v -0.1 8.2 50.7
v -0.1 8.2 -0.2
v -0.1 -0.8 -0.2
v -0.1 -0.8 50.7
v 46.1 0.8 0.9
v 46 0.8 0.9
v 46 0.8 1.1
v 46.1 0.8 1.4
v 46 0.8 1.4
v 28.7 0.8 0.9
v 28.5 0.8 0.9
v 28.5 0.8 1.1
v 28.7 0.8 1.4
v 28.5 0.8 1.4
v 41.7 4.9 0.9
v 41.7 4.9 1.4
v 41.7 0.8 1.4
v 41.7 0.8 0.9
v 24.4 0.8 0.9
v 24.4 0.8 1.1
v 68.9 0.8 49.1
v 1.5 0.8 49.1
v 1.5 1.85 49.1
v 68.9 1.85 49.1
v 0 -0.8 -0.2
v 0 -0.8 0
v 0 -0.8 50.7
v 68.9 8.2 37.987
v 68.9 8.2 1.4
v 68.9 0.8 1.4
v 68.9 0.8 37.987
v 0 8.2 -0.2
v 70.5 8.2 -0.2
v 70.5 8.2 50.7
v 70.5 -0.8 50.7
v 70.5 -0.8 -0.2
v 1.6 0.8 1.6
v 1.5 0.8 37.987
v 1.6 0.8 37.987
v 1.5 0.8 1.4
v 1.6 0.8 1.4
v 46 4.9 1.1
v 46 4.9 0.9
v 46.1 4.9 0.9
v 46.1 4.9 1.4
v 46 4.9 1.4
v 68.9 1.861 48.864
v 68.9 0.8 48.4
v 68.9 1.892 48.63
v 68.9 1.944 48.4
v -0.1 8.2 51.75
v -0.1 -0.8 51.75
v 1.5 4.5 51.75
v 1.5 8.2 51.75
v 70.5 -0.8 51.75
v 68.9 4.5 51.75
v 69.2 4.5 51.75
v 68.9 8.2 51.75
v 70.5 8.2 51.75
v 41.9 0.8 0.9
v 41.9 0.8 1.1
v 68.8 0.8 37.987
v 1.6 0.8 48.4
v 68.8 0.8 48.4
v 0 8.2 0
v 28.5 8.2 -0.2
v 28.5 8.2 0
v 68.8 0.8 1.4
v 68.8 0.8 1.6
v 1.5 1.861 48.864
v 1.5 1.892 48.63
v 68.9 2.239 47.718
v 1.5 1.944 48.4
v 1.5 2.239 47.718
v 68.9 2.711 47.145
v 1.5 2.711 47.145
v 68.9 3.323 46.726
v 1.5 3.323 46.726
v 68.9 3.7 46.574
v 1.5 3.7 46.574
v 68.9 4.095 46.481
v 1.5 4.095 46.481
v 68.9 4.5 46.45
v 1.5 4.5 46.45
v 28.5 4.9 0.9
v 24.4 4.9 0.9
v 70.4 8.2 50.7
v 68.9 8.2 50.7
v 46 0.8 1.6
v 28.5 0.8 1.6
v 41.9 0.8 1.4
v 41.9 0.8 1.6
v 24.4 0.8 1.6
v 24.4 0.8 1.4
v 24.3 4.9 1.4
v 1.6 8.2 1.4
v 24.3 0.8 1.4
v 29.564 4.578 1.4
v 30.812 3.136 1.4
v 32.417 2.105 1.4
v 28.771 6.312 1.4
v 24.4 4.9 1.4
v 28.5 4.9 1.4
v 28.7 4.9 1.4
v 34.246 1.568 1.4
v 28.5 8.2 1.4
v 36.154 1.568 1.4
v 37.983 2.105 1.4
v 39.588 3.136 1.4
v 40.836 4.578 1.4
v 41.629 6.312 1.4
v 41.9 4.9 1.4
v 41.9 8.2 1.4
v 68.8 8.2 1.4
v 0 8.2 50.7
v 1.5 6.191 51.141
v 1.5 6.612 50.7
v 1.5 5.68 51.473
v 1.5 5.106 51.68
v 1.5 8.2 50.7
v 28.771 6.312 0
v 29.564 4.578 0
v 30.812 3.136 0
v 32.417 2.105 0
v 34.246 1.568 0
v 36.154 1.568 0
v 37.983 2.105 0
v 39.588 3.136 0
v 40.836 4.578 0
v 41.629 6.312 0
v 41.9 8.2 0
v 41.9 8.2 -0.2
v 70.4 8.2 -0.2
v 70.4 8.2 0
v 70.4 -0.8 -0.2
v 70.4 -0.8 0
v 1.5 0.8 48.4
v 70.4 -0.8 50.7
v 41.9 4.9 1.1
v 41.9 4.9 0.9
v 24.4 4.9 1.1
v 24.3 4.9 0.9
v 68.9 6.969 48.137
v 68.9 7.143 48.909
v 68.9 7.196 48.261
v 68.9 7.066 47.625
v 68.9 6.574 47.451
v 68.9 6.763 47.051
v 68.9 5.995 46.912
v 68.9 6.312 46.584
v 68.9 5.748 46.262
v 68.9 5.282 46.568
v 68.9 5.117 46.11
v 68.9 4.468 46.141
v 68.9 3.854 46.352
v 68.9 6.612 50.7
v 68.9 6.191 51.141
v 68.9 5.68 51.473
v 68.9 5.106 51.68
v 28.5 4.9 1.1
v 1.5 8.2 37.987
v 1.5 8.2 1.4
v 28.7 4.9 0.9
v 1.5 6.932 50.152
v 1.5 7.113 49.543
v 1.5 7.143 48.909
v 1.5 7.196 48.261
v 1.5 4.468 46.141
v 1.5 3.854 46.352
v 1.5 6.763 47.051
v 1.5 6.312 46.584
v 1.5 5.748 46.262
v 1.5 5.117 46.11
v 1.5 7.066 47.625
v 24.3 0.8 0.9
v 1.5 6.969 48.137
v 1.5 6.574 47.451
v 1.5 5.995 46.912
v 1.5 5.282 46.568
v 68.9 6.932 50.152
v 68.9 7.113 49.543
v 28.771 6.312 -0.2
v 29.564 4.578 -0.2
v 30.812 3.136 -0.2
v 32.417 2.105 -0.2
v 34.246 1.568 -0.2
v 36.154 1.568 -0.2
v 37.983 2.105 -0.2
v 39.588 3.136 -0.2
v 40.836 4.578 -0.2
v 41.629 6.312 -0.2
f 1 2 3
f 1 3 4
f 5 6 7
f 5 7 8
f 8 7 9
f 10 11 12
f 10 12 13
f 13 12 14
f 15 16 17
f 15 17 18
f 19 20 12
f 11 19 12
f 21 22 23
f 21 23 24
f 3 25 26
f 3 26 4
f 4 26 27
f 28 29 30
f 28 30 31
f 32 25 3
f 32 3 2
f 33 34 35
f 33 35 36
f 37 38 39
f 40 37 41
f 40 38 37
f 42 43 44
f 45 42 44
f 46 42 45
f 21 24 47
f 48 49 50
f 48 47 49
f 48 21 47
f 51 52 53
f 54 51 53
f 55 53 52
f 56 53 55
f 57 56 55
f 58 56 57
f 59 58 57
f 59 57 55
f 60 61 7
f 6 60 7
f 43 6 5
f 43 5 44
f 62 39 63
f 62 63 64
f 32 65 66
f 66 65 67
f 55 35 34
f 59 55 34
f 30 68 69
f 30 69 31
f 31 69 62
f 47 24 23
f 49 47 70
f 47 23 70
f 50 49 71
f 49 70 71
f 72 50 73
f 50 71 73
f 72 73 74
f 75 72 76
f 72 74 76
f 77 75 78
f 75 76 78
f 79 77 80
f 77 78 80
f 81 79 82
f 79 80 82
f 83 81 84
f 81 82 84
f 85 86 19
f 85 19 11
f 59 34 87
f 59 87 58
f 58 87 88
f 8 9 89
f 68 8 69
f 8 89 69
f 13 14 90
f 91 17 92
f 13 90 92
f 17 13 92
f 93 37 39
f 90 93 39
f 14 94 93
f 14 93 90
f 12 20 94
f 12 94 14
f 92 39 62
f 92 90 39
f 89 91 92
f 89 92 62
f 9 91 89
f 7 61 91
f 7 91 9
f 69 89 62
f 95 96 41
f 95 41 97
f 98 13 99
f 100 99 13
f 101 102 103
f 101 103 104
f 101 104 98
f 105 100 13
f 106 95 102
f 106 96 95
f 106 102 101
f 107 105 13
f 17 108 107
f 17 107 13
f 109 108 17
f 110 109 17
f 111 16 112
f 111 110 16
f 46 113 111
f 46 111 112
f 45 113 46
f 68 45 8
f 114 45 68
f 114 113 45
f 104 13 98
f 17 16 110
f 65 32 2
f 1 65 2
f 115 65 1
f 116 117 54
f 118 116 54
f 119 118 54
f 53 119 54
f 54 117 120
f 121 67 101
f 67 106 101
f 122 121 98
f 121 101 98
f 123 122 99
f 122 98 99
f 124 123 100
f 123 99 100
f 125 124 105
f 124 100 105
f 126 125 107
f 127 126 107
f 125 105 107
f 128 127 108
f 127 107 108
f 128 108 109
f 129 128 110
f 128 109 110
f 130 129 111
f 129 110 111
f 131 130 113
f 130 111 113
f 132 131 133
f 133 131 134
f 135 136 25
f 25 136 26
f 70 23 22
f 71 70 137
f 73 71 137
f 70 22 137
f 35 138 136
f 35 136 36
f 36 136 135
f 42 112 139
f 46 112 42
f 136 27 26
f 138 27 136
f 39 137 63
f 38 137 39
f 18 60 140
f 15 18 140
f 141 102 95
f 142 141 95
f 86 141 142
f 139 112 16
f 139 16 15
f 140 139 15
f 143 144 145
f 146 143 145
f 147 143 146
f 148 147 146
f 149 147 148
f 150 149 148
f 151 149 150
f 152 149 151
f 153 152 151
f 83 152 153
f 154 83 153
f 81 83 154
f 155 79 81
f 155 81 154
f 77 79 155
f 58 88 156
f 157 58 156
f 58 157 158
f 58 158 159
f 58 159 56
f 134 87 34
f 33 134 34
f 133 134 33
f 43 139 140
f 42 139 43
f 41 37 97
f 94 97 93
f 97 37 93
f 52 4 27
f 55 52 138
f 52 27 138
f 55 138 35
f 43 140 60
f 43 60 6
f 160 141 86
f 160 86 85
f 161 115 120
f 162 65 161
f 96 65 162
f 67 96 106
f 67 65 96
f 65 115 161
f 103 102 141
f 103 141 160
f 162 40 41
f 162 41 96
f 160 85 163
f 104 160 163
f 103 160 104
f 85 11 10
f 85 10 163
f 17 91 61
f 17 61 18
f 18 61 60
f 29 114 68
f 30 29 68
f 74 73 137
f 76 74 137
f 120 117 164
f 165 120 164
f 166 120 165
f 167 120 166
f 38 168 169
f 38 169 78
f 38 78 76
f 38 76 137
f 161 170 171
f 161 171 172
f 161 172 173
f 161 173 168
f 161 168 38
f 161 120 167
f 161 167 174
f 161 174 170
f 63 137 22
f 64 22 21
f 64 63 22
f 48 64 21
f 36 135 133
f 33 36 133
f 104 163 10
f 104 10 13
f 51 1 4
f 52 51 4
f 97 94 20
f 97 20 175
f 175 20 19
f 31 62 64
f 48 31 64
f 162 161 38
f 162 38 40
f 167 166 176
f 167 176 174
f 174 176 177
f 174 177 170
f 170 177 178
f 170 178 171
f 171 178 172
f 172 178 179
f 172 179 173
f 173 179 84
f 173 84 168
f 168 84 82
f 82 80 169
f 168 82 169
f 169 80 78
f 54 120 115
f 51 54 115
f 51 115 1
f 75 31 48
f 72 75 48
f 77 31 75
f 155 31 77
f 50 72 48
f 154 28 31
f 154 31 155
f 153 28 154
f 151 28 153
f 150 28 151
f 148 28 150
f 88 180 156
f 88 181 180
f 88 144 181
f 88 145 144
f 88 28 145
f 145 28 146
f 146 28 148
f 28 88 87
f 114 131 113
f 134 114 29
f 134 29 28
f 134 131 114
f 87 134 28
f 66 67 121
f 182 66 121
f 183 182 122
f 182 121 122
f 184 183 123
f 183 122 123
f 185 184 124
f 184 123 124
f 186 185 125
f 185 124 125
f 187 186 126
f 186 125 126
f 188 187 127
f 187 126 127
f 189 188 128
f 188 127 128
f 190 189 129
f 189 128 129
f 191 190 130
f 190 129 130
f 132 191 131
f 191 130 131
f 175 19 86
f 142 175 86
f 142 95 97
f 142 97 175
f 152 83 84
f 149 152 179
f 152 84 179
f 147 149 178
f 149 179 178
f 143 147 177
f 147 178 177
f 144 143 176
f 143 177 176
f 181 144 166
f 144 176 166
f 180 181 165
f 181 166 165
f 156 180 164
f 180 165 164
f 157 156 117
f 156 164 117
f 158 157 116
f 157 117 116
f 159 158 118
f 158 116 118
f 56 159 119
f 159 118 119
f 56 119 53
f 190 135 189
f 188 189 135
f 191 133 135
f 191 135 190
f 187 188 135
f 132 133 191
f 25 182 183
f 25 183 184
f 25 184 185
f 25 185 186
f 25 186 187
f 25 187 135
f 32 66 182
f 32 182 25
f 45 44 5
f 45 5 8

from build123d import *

# Parameters (mm, degrees)
SKETCH1_W            = 70.4
SKETCH1_H            = 50.7
BOSS_EXTRUDE1_DEPTH  = 1.6
SKETCH2_W            = 70.4
SKETCH2_H            = 2.3
BOSS_EXTRUDE2_DEPTH  = 3.3
SKETCH4_R            = 2.3
BOSS_EXTRUDE3_DEPTH  = 70.4
BOSS_EXTRUDE4_DEPTH  = 6.6
SKETCH6_R            = 6.7
CUT_EXTRUDE1_DEPTH   = 6.6
SKETCH7_W            = 4.1
SKETCH7_H            = 3.3
CUT_EXTRUDE2_DEPTH   = 0.5
SKETCH9_W            = 70.4
SKETCH9_H            = 50.7
BOSS_EXTRUDE5_DEPTH  = 0.8
CUT_EXTRUDE3_DEPTH   = 0.8
BOSS_EXTRUDE6_DEPTH  = 0.2
CUT_EXTRUDE4_DEPTH   = 0.2
SKETCH13_W           = 4.1
SKETCH13_H           = 4.1
CUT_EXTRUDE5_DEPTH   = 0.2
SKETCH14_W           = 50.9
SKETCH14_H           = 9
BOSS_EXTRUDE7_DEPTH  = 0.1
CUT_EXTRUDE6_START   = -0.1
CUT_EXTRUDE6_DEPTH   = 0.1
CUT_EXTRUDE7_DEPTH   = 0.1
SKETCH17_W           = 50.9
SKETCH17_H           = 9
BOSS_EXTRUDE8_DEPTH  = 0.1
SKETCH18_W           = 0.5
SKETCH18_H           = 4.1
CUT_EXTRUDE8_DEPTH   = 0.2
SKETCH19_W           = 0.5
SKETCH19_H           = 4.1
CUT_EXTRUDE9_DEPTH   = 0.2
SKETCH21_W           = 0.5
SKETCH21_H           = 4.1
CUT_EXTRUDE10_DEPTH  = 0.1
SKETCH22_W           = 0.5
SKETCH22_H           = 4.1
CUT_EXTRUDE11_DEPTH  = 0.1
SKETCH24_W           = 67.4
SKETCH24_H           = 15.486571252
CUT_EXTRUDE12_DEPTH  = 23.1
SKETCH25_W           = 67.4
SKETCH25_H           = 1.6
BOSS_EXTRUDE9_DEPTH  = 3.7
SKETCH26_R           = 2.65
BOSS_EXTRUDE10_DEPTH = 67.7
BOSS_EXTRUDE13_DEPTH = 1.05


with BuildPart() as part:
    # Sketch1 → Boss-Extrude1 (new body)
    with BuildSketch(Plane(origin=(0, 0, 0), x_dir=(1, 0, 0), z_dir=(0, 1, 0))):
        with Locations((35.2, -25.35)):
            Rectangle(SKETCH1_W, SKETCH1_H)
    extrude(amount=BOSS_EXTRUDE1_DEPTH)

    # Sketch2 → Boss-Extrude2 (add)
    with BuildSketch(Plane(origin=(0, 1.6, 0), x_dir=(1, 0, 0), z_dir=(0, 1, 0))):
        with Locations((35.2, -49.55)):
            Rectangle(SKETCH2_W, SKETCH2_H)
    extrude(amount=BOSS_EXTRUDE2_DEPTH)

    # Sketch4 → Boss-Extrude3 (add)
    with BuildSketch(Plane.ZY):
        with Locations((48.4, 4.9)):
            Circle(SKETCH4_R)
    extrude(amount=-BOSS_EXTRUDE3_DEPTH)

    # Sketch5 → Boss-Extrude4 (add)
    with BuildSketch(Plane(origin=(0, 1.6, 0), x_dir=(1, 0, 0), z_dir=(0, 1, 0))):
        Polygon((1.6, -1.6), (68.8, -1.6), (68.8, -50.7), (70.4, -50.7), (70.4, 0), (0, 0), (0, -50.7), (1.6, -50.7), align=None)
    extrude(amount=BOSS_EXTRUDE4_DEPTH)

    # Sketch6 → Cut-Extrude1 (cut)
    with BuildSketch(Plane.XY.offset(1.6)):
        with Locations((35.2, 8.2)):
            Circle(SKETCH6_R)
    extrude(amount=-CUT_EXTRUDE1_DEPTH, mode=Mode.SUBTRACT)

    # Sketch7 → Cut-Extrude2 (cut)
    with BuildSketch(Plane.XY.offset(1.6)):
        with Locations((43.95, 3.25)):
            Rectangle(SKETCH7_W, SKETCH7_H)
        with Locations((26.45, 3.25)):
            Rectangle(SKETCH7_W, SKETCH7_H)
    extrude(amount=-CUT_EXTRUDE2_DEPTH, mode=Mode.SUBTRACT)

    # Sketch9 → Boss-Extrude5 (add)
    with BuildSketch(Plane.XZ):
        with Locations((35.2, 25.35)):
            Rectangle(SKETCH9_W, SKETCH9_H)
    extrude(amount=BOSS_EXTRUDE5_DEPTH)

    # Sketch10 → Cut-Extrude3 (cut)
    with BuildSketch(Plane(origin=(0, 1.6, 0), x_dir=(1, 0, 0), z_dir=(0, 1, 0))):
        Polygon((24.4, -1.6), (1.6, -1.6), (1.6, -48.4), (68.8, -48.4), (68.8, -1.6), (46, -1.6), (46, -1.1), (41.9, -1.1), (41.9, -1.6), (36.353256259, -1.6), (34.046743741, -1.6), (28.5, -1.6), (28.5, -1.1), (24.4, -1.1), align=None)
    extrude(amount=-CUT_EXTRUDE3_DEPTH, mode=Mode.SUBTRACT)

    # Sketch11 → Boss-Extrude6 (add)
    with BuildSketch(Plane(origin=(0, 0, 0), x_dir=(-1, 0, 0), z_dir=(0, 0, -1))):
        with BuildLine():
            Line((0, 8.2), (-28.5, 8.2))
            ThreePointArc((-28.5, 8.2), (-35.2, 1.5), (-41.9, 8.2))
            Line((-41.9, 8.2), (-70.4, 8.2))
            Line((-70.4, 8.2), (-70.4, -0.8))
            Line((-70.4, -0.8), (0, -0.8))
            Line((0, -0.8), (0, 8.2))
        make_face()
    extrude(amount=BOSS_EXTRUDE6_DEPTH)

    # Sketch12 → Cut-Extrude4 (cut)
    with BuildSketch(Plane.XY.offset(1.6)):
        with BuildLine():
            Line((28.5, 4.9), (28.5, 0.8))
            Line((28.5, 0.8), (41.9, 0.8))
            Line((41.9, 0.8), (41.9, 4.9))
            Line((41.9, 4.9), (46, 4.9))
            Line((46, 4.9), (46, 0.8))
            Line((46, 0.8), (68.8, 0.8))
            Line((68.8, 0.8), (68.8, 8.2))
            Line((68.8, 8.2), (41.9, 8.2))
            ThreePointArc((41.9, 8.2), (35.2, 1.5), (28.5, 8.2))
            Line((28.5, 8.2), (1.6, 8.2))
            Line((1.6, 8.2), (1.6, 0.8))
            Line((1.6, 0.8), (24.4, 0.8))
            Line((24.4, 0.8), (24.4, 4.9))
            Line((24.4, 4.9), (28.5, 4.9))
        make_face()
    extrude(amount=-CUT_EXTRUDE4_DEPTH, mode=Mode.SUBTRACT)

    # Sketch13 → Cut-Extrude5 (cut)
    with BuildSketch(Plane.XY.offset(1.1)):
        with Locations((43.95, 2.85)):
            Rectangle(SKETCH13_W, SKETCH13_H)
        with Locations((26.45, 2.85)):
            Rectangle(SKETCH13_W, SKETCH13_H)
    extrude(amount=-CUT_EXTRUDE5_DEPTH, mode=Mode.SUBTRACT)

    # Sketch14 → Boss-Extrude7 (add)
    with BuildSketch(Plane.ZY):
        with Locations((25.25, 3.7)):
            Rectangle(SKETCH14_W, SKETCH14_H)
    extrude(amount=BOSS_EXTRUDE7_DEPTH)

    # Sketch15 → Cut-Extrude6 (cut)
    with BuildSketch(Plane(origin=(1.6, 0, 0), x_dir=(0, 0, -1), z_dir=(1, 0, 0)).offset(CUT_EXTRUDE6_START)):
        with BuildLine():
            Line((-48.4, 2.6), (-48.4, 0.8))
            Line((-48.4, 0.8), (-1.4, 0.8))
            Line((-1.4, 0.8), (-1.4, 8.2))
            Line((-1.4, 8.2), (-50.7, 8.2))
            Line((-50.7, 8.2), (-50.7, 4.9))
            ThreePointArc((-50.7, 4.9), (-46.773654403, 6.526345597), (-48.4, 2.6))
        make_face()
    extrude(amount=CUT_EXTRUDE6_DEPTH, mode=Mode.SUBTRACT)

    # Sketch16 → Cut-Extrude7 (cut)
    with BuildSketch(Plane.ZY.offset(-68.8)):
        with BuildLine():
            Line((50.7, 8.2), (1.4, 8.2))
            Line((1.4, 8.2), (1.4, 0.8))
            Line((1.4, 0.8), (48.4, 0.8))
            Line((48.4, 0.8), (48.4, 2.6))
            ThreePointArc((48.4, 2.6), (46.773654403, 6.526345597), (50.7, 4.9))
            Line((50.7, 4.9), (50.7, 8.2))
        make_face()
    extrude(amount=-CUT_EXTRUDE7_DEPTH, mode=Mode.SUBTRACT)

    # Sketch17 → Boss-Extrude8 (add)
    with BuildSketch(Plane(origin=(70.4, 0, 0), x_dir=(0, 0, -1), z_dir=(1, 0, 0))):
        with Locations((-25.25, 3.7)):
            Rectangle(SKETCH17_W, SKETCH17_H)
    extrude(amount=BOSS_EXTRUDE8_DEPTH)

    # Sketch18 → Cut-Extrude8 (cut)
    with BuildSketch(Plane(origin=(41.9, 0, 0), x_dir=(0, 0, -1), z_dir=(1, 0, 0))):
        with Locations((-1.15, 2.85)):
            Rectangle(SKETCH18_W, SKETCH18_H)
    extrude(amount=-CUT_EXTRUDE8_DEPTH, mode=Mode.SUBTRACT)

    # Sketch19 → Cut-Extrude9 (cut)
    with BuildSketch(Plane.ZY.offset(-28.5)):
        with Locations((1.15, 2.85)):
            Rectangle(SKETCH19_W, SKETCH19_H)
    extrude(amount=-CUT_EXTRUDE9_DEPTH, mode=Mode.SUBTRACT)

    # Sketch21 → Cut-Extrude10 (cut)
    with BuildSketch(Plane.ZY.offset(-46)):
        with Locations((1.15, 2.85)):
            Rectangle(SKETCH21_W, SKETCH21_H)
    extrude(amount=-CUT_EXTRUDE10_DEPTH, mode=Mode.SUBTRACT)

    # Sketch22 → Cut-Extrude11 (cut)
    with BuildSketch(Plane(origin=(24.4, 0, 0), x_dir=(0, 0, -1), z_dir=(1, 0, 0))):
        with Locations((-1.15, 2.85)):
            Rectangle(SKETCH22_W, SKETCH22_H)
    extrude(amount=-CUT_EXTRUDE11_DEPTH, mode=Mode.SUBTRACT)

    # Sketch24 → Cut-Extrude12 (cut)
    with BuildSketch(Plane(origin=(0, 0.8, 0), x_dir=(1, 0, 0), z_dir=(0, 1, 0))):
        with Locations((35.2, -45.729904974)):
            Rectangle(SKETCH24_W, SKETCH24_H)
    extrude(amount=CUT_EXTRUDE12_DEPTH, mode=Mode.SUBTRACT)

    # Sketch25 → Boss-Extrude9 (add)
    with BuildSketch(Plane(origin=(0, 0.8, 0), x_dir=(1, 0, 0), z_dir=(0, 1, 0))):
        with Locations((35.2, -49.9)):
            Rectangle(SKETCH25_W, SKETCH25_H)
    extrude(amount=BOSS_EXTRUDE9_DEPTH)

    # Sketch26 → Boss-Extrude10 (add)
    with BuildSketch(Plane(origin=(1.5, 0, 0), x_dir=(0, 0, -1), z_dir=(1, 0, 0))):
        with Locations((-49.1, 4.5)):
            Circle(SKETCH26_R)
    extrude(amount=BOSS_EXTRUDE10_DEPTH)

    # Sketch27 → Boss-Extrude13 (add)
    with BuildSketch(Plane.XY.offset(50.7)):
        Polygon((68.9, -0.8), (70.5, -0.8), (70.5, 4.77), (70.5, 8.2), (68.9, 8.2), (68.9, 6.612463017), (69.2, 6.612463017), (69.2, 2.387536983), (1.5, 2.387536983), (1.5, 4.5), (1.5, 6.612463017), (1.5, 8.2), (-0.1, 8.2), (-0.1, 4.77), (-0.1, -0.8), (1.5, -0.8), align=None)
        Polygon((69.2, 6.612463017), (68.9, 6.612463017), (68.9, 4.5), (1.5, 4.5), (1.5, 2.387536983), (69.2, 2.387536983), align=None)
    extrude(amount=BOSS_EXTRUDE13_DEPTH)


solid = part.part
